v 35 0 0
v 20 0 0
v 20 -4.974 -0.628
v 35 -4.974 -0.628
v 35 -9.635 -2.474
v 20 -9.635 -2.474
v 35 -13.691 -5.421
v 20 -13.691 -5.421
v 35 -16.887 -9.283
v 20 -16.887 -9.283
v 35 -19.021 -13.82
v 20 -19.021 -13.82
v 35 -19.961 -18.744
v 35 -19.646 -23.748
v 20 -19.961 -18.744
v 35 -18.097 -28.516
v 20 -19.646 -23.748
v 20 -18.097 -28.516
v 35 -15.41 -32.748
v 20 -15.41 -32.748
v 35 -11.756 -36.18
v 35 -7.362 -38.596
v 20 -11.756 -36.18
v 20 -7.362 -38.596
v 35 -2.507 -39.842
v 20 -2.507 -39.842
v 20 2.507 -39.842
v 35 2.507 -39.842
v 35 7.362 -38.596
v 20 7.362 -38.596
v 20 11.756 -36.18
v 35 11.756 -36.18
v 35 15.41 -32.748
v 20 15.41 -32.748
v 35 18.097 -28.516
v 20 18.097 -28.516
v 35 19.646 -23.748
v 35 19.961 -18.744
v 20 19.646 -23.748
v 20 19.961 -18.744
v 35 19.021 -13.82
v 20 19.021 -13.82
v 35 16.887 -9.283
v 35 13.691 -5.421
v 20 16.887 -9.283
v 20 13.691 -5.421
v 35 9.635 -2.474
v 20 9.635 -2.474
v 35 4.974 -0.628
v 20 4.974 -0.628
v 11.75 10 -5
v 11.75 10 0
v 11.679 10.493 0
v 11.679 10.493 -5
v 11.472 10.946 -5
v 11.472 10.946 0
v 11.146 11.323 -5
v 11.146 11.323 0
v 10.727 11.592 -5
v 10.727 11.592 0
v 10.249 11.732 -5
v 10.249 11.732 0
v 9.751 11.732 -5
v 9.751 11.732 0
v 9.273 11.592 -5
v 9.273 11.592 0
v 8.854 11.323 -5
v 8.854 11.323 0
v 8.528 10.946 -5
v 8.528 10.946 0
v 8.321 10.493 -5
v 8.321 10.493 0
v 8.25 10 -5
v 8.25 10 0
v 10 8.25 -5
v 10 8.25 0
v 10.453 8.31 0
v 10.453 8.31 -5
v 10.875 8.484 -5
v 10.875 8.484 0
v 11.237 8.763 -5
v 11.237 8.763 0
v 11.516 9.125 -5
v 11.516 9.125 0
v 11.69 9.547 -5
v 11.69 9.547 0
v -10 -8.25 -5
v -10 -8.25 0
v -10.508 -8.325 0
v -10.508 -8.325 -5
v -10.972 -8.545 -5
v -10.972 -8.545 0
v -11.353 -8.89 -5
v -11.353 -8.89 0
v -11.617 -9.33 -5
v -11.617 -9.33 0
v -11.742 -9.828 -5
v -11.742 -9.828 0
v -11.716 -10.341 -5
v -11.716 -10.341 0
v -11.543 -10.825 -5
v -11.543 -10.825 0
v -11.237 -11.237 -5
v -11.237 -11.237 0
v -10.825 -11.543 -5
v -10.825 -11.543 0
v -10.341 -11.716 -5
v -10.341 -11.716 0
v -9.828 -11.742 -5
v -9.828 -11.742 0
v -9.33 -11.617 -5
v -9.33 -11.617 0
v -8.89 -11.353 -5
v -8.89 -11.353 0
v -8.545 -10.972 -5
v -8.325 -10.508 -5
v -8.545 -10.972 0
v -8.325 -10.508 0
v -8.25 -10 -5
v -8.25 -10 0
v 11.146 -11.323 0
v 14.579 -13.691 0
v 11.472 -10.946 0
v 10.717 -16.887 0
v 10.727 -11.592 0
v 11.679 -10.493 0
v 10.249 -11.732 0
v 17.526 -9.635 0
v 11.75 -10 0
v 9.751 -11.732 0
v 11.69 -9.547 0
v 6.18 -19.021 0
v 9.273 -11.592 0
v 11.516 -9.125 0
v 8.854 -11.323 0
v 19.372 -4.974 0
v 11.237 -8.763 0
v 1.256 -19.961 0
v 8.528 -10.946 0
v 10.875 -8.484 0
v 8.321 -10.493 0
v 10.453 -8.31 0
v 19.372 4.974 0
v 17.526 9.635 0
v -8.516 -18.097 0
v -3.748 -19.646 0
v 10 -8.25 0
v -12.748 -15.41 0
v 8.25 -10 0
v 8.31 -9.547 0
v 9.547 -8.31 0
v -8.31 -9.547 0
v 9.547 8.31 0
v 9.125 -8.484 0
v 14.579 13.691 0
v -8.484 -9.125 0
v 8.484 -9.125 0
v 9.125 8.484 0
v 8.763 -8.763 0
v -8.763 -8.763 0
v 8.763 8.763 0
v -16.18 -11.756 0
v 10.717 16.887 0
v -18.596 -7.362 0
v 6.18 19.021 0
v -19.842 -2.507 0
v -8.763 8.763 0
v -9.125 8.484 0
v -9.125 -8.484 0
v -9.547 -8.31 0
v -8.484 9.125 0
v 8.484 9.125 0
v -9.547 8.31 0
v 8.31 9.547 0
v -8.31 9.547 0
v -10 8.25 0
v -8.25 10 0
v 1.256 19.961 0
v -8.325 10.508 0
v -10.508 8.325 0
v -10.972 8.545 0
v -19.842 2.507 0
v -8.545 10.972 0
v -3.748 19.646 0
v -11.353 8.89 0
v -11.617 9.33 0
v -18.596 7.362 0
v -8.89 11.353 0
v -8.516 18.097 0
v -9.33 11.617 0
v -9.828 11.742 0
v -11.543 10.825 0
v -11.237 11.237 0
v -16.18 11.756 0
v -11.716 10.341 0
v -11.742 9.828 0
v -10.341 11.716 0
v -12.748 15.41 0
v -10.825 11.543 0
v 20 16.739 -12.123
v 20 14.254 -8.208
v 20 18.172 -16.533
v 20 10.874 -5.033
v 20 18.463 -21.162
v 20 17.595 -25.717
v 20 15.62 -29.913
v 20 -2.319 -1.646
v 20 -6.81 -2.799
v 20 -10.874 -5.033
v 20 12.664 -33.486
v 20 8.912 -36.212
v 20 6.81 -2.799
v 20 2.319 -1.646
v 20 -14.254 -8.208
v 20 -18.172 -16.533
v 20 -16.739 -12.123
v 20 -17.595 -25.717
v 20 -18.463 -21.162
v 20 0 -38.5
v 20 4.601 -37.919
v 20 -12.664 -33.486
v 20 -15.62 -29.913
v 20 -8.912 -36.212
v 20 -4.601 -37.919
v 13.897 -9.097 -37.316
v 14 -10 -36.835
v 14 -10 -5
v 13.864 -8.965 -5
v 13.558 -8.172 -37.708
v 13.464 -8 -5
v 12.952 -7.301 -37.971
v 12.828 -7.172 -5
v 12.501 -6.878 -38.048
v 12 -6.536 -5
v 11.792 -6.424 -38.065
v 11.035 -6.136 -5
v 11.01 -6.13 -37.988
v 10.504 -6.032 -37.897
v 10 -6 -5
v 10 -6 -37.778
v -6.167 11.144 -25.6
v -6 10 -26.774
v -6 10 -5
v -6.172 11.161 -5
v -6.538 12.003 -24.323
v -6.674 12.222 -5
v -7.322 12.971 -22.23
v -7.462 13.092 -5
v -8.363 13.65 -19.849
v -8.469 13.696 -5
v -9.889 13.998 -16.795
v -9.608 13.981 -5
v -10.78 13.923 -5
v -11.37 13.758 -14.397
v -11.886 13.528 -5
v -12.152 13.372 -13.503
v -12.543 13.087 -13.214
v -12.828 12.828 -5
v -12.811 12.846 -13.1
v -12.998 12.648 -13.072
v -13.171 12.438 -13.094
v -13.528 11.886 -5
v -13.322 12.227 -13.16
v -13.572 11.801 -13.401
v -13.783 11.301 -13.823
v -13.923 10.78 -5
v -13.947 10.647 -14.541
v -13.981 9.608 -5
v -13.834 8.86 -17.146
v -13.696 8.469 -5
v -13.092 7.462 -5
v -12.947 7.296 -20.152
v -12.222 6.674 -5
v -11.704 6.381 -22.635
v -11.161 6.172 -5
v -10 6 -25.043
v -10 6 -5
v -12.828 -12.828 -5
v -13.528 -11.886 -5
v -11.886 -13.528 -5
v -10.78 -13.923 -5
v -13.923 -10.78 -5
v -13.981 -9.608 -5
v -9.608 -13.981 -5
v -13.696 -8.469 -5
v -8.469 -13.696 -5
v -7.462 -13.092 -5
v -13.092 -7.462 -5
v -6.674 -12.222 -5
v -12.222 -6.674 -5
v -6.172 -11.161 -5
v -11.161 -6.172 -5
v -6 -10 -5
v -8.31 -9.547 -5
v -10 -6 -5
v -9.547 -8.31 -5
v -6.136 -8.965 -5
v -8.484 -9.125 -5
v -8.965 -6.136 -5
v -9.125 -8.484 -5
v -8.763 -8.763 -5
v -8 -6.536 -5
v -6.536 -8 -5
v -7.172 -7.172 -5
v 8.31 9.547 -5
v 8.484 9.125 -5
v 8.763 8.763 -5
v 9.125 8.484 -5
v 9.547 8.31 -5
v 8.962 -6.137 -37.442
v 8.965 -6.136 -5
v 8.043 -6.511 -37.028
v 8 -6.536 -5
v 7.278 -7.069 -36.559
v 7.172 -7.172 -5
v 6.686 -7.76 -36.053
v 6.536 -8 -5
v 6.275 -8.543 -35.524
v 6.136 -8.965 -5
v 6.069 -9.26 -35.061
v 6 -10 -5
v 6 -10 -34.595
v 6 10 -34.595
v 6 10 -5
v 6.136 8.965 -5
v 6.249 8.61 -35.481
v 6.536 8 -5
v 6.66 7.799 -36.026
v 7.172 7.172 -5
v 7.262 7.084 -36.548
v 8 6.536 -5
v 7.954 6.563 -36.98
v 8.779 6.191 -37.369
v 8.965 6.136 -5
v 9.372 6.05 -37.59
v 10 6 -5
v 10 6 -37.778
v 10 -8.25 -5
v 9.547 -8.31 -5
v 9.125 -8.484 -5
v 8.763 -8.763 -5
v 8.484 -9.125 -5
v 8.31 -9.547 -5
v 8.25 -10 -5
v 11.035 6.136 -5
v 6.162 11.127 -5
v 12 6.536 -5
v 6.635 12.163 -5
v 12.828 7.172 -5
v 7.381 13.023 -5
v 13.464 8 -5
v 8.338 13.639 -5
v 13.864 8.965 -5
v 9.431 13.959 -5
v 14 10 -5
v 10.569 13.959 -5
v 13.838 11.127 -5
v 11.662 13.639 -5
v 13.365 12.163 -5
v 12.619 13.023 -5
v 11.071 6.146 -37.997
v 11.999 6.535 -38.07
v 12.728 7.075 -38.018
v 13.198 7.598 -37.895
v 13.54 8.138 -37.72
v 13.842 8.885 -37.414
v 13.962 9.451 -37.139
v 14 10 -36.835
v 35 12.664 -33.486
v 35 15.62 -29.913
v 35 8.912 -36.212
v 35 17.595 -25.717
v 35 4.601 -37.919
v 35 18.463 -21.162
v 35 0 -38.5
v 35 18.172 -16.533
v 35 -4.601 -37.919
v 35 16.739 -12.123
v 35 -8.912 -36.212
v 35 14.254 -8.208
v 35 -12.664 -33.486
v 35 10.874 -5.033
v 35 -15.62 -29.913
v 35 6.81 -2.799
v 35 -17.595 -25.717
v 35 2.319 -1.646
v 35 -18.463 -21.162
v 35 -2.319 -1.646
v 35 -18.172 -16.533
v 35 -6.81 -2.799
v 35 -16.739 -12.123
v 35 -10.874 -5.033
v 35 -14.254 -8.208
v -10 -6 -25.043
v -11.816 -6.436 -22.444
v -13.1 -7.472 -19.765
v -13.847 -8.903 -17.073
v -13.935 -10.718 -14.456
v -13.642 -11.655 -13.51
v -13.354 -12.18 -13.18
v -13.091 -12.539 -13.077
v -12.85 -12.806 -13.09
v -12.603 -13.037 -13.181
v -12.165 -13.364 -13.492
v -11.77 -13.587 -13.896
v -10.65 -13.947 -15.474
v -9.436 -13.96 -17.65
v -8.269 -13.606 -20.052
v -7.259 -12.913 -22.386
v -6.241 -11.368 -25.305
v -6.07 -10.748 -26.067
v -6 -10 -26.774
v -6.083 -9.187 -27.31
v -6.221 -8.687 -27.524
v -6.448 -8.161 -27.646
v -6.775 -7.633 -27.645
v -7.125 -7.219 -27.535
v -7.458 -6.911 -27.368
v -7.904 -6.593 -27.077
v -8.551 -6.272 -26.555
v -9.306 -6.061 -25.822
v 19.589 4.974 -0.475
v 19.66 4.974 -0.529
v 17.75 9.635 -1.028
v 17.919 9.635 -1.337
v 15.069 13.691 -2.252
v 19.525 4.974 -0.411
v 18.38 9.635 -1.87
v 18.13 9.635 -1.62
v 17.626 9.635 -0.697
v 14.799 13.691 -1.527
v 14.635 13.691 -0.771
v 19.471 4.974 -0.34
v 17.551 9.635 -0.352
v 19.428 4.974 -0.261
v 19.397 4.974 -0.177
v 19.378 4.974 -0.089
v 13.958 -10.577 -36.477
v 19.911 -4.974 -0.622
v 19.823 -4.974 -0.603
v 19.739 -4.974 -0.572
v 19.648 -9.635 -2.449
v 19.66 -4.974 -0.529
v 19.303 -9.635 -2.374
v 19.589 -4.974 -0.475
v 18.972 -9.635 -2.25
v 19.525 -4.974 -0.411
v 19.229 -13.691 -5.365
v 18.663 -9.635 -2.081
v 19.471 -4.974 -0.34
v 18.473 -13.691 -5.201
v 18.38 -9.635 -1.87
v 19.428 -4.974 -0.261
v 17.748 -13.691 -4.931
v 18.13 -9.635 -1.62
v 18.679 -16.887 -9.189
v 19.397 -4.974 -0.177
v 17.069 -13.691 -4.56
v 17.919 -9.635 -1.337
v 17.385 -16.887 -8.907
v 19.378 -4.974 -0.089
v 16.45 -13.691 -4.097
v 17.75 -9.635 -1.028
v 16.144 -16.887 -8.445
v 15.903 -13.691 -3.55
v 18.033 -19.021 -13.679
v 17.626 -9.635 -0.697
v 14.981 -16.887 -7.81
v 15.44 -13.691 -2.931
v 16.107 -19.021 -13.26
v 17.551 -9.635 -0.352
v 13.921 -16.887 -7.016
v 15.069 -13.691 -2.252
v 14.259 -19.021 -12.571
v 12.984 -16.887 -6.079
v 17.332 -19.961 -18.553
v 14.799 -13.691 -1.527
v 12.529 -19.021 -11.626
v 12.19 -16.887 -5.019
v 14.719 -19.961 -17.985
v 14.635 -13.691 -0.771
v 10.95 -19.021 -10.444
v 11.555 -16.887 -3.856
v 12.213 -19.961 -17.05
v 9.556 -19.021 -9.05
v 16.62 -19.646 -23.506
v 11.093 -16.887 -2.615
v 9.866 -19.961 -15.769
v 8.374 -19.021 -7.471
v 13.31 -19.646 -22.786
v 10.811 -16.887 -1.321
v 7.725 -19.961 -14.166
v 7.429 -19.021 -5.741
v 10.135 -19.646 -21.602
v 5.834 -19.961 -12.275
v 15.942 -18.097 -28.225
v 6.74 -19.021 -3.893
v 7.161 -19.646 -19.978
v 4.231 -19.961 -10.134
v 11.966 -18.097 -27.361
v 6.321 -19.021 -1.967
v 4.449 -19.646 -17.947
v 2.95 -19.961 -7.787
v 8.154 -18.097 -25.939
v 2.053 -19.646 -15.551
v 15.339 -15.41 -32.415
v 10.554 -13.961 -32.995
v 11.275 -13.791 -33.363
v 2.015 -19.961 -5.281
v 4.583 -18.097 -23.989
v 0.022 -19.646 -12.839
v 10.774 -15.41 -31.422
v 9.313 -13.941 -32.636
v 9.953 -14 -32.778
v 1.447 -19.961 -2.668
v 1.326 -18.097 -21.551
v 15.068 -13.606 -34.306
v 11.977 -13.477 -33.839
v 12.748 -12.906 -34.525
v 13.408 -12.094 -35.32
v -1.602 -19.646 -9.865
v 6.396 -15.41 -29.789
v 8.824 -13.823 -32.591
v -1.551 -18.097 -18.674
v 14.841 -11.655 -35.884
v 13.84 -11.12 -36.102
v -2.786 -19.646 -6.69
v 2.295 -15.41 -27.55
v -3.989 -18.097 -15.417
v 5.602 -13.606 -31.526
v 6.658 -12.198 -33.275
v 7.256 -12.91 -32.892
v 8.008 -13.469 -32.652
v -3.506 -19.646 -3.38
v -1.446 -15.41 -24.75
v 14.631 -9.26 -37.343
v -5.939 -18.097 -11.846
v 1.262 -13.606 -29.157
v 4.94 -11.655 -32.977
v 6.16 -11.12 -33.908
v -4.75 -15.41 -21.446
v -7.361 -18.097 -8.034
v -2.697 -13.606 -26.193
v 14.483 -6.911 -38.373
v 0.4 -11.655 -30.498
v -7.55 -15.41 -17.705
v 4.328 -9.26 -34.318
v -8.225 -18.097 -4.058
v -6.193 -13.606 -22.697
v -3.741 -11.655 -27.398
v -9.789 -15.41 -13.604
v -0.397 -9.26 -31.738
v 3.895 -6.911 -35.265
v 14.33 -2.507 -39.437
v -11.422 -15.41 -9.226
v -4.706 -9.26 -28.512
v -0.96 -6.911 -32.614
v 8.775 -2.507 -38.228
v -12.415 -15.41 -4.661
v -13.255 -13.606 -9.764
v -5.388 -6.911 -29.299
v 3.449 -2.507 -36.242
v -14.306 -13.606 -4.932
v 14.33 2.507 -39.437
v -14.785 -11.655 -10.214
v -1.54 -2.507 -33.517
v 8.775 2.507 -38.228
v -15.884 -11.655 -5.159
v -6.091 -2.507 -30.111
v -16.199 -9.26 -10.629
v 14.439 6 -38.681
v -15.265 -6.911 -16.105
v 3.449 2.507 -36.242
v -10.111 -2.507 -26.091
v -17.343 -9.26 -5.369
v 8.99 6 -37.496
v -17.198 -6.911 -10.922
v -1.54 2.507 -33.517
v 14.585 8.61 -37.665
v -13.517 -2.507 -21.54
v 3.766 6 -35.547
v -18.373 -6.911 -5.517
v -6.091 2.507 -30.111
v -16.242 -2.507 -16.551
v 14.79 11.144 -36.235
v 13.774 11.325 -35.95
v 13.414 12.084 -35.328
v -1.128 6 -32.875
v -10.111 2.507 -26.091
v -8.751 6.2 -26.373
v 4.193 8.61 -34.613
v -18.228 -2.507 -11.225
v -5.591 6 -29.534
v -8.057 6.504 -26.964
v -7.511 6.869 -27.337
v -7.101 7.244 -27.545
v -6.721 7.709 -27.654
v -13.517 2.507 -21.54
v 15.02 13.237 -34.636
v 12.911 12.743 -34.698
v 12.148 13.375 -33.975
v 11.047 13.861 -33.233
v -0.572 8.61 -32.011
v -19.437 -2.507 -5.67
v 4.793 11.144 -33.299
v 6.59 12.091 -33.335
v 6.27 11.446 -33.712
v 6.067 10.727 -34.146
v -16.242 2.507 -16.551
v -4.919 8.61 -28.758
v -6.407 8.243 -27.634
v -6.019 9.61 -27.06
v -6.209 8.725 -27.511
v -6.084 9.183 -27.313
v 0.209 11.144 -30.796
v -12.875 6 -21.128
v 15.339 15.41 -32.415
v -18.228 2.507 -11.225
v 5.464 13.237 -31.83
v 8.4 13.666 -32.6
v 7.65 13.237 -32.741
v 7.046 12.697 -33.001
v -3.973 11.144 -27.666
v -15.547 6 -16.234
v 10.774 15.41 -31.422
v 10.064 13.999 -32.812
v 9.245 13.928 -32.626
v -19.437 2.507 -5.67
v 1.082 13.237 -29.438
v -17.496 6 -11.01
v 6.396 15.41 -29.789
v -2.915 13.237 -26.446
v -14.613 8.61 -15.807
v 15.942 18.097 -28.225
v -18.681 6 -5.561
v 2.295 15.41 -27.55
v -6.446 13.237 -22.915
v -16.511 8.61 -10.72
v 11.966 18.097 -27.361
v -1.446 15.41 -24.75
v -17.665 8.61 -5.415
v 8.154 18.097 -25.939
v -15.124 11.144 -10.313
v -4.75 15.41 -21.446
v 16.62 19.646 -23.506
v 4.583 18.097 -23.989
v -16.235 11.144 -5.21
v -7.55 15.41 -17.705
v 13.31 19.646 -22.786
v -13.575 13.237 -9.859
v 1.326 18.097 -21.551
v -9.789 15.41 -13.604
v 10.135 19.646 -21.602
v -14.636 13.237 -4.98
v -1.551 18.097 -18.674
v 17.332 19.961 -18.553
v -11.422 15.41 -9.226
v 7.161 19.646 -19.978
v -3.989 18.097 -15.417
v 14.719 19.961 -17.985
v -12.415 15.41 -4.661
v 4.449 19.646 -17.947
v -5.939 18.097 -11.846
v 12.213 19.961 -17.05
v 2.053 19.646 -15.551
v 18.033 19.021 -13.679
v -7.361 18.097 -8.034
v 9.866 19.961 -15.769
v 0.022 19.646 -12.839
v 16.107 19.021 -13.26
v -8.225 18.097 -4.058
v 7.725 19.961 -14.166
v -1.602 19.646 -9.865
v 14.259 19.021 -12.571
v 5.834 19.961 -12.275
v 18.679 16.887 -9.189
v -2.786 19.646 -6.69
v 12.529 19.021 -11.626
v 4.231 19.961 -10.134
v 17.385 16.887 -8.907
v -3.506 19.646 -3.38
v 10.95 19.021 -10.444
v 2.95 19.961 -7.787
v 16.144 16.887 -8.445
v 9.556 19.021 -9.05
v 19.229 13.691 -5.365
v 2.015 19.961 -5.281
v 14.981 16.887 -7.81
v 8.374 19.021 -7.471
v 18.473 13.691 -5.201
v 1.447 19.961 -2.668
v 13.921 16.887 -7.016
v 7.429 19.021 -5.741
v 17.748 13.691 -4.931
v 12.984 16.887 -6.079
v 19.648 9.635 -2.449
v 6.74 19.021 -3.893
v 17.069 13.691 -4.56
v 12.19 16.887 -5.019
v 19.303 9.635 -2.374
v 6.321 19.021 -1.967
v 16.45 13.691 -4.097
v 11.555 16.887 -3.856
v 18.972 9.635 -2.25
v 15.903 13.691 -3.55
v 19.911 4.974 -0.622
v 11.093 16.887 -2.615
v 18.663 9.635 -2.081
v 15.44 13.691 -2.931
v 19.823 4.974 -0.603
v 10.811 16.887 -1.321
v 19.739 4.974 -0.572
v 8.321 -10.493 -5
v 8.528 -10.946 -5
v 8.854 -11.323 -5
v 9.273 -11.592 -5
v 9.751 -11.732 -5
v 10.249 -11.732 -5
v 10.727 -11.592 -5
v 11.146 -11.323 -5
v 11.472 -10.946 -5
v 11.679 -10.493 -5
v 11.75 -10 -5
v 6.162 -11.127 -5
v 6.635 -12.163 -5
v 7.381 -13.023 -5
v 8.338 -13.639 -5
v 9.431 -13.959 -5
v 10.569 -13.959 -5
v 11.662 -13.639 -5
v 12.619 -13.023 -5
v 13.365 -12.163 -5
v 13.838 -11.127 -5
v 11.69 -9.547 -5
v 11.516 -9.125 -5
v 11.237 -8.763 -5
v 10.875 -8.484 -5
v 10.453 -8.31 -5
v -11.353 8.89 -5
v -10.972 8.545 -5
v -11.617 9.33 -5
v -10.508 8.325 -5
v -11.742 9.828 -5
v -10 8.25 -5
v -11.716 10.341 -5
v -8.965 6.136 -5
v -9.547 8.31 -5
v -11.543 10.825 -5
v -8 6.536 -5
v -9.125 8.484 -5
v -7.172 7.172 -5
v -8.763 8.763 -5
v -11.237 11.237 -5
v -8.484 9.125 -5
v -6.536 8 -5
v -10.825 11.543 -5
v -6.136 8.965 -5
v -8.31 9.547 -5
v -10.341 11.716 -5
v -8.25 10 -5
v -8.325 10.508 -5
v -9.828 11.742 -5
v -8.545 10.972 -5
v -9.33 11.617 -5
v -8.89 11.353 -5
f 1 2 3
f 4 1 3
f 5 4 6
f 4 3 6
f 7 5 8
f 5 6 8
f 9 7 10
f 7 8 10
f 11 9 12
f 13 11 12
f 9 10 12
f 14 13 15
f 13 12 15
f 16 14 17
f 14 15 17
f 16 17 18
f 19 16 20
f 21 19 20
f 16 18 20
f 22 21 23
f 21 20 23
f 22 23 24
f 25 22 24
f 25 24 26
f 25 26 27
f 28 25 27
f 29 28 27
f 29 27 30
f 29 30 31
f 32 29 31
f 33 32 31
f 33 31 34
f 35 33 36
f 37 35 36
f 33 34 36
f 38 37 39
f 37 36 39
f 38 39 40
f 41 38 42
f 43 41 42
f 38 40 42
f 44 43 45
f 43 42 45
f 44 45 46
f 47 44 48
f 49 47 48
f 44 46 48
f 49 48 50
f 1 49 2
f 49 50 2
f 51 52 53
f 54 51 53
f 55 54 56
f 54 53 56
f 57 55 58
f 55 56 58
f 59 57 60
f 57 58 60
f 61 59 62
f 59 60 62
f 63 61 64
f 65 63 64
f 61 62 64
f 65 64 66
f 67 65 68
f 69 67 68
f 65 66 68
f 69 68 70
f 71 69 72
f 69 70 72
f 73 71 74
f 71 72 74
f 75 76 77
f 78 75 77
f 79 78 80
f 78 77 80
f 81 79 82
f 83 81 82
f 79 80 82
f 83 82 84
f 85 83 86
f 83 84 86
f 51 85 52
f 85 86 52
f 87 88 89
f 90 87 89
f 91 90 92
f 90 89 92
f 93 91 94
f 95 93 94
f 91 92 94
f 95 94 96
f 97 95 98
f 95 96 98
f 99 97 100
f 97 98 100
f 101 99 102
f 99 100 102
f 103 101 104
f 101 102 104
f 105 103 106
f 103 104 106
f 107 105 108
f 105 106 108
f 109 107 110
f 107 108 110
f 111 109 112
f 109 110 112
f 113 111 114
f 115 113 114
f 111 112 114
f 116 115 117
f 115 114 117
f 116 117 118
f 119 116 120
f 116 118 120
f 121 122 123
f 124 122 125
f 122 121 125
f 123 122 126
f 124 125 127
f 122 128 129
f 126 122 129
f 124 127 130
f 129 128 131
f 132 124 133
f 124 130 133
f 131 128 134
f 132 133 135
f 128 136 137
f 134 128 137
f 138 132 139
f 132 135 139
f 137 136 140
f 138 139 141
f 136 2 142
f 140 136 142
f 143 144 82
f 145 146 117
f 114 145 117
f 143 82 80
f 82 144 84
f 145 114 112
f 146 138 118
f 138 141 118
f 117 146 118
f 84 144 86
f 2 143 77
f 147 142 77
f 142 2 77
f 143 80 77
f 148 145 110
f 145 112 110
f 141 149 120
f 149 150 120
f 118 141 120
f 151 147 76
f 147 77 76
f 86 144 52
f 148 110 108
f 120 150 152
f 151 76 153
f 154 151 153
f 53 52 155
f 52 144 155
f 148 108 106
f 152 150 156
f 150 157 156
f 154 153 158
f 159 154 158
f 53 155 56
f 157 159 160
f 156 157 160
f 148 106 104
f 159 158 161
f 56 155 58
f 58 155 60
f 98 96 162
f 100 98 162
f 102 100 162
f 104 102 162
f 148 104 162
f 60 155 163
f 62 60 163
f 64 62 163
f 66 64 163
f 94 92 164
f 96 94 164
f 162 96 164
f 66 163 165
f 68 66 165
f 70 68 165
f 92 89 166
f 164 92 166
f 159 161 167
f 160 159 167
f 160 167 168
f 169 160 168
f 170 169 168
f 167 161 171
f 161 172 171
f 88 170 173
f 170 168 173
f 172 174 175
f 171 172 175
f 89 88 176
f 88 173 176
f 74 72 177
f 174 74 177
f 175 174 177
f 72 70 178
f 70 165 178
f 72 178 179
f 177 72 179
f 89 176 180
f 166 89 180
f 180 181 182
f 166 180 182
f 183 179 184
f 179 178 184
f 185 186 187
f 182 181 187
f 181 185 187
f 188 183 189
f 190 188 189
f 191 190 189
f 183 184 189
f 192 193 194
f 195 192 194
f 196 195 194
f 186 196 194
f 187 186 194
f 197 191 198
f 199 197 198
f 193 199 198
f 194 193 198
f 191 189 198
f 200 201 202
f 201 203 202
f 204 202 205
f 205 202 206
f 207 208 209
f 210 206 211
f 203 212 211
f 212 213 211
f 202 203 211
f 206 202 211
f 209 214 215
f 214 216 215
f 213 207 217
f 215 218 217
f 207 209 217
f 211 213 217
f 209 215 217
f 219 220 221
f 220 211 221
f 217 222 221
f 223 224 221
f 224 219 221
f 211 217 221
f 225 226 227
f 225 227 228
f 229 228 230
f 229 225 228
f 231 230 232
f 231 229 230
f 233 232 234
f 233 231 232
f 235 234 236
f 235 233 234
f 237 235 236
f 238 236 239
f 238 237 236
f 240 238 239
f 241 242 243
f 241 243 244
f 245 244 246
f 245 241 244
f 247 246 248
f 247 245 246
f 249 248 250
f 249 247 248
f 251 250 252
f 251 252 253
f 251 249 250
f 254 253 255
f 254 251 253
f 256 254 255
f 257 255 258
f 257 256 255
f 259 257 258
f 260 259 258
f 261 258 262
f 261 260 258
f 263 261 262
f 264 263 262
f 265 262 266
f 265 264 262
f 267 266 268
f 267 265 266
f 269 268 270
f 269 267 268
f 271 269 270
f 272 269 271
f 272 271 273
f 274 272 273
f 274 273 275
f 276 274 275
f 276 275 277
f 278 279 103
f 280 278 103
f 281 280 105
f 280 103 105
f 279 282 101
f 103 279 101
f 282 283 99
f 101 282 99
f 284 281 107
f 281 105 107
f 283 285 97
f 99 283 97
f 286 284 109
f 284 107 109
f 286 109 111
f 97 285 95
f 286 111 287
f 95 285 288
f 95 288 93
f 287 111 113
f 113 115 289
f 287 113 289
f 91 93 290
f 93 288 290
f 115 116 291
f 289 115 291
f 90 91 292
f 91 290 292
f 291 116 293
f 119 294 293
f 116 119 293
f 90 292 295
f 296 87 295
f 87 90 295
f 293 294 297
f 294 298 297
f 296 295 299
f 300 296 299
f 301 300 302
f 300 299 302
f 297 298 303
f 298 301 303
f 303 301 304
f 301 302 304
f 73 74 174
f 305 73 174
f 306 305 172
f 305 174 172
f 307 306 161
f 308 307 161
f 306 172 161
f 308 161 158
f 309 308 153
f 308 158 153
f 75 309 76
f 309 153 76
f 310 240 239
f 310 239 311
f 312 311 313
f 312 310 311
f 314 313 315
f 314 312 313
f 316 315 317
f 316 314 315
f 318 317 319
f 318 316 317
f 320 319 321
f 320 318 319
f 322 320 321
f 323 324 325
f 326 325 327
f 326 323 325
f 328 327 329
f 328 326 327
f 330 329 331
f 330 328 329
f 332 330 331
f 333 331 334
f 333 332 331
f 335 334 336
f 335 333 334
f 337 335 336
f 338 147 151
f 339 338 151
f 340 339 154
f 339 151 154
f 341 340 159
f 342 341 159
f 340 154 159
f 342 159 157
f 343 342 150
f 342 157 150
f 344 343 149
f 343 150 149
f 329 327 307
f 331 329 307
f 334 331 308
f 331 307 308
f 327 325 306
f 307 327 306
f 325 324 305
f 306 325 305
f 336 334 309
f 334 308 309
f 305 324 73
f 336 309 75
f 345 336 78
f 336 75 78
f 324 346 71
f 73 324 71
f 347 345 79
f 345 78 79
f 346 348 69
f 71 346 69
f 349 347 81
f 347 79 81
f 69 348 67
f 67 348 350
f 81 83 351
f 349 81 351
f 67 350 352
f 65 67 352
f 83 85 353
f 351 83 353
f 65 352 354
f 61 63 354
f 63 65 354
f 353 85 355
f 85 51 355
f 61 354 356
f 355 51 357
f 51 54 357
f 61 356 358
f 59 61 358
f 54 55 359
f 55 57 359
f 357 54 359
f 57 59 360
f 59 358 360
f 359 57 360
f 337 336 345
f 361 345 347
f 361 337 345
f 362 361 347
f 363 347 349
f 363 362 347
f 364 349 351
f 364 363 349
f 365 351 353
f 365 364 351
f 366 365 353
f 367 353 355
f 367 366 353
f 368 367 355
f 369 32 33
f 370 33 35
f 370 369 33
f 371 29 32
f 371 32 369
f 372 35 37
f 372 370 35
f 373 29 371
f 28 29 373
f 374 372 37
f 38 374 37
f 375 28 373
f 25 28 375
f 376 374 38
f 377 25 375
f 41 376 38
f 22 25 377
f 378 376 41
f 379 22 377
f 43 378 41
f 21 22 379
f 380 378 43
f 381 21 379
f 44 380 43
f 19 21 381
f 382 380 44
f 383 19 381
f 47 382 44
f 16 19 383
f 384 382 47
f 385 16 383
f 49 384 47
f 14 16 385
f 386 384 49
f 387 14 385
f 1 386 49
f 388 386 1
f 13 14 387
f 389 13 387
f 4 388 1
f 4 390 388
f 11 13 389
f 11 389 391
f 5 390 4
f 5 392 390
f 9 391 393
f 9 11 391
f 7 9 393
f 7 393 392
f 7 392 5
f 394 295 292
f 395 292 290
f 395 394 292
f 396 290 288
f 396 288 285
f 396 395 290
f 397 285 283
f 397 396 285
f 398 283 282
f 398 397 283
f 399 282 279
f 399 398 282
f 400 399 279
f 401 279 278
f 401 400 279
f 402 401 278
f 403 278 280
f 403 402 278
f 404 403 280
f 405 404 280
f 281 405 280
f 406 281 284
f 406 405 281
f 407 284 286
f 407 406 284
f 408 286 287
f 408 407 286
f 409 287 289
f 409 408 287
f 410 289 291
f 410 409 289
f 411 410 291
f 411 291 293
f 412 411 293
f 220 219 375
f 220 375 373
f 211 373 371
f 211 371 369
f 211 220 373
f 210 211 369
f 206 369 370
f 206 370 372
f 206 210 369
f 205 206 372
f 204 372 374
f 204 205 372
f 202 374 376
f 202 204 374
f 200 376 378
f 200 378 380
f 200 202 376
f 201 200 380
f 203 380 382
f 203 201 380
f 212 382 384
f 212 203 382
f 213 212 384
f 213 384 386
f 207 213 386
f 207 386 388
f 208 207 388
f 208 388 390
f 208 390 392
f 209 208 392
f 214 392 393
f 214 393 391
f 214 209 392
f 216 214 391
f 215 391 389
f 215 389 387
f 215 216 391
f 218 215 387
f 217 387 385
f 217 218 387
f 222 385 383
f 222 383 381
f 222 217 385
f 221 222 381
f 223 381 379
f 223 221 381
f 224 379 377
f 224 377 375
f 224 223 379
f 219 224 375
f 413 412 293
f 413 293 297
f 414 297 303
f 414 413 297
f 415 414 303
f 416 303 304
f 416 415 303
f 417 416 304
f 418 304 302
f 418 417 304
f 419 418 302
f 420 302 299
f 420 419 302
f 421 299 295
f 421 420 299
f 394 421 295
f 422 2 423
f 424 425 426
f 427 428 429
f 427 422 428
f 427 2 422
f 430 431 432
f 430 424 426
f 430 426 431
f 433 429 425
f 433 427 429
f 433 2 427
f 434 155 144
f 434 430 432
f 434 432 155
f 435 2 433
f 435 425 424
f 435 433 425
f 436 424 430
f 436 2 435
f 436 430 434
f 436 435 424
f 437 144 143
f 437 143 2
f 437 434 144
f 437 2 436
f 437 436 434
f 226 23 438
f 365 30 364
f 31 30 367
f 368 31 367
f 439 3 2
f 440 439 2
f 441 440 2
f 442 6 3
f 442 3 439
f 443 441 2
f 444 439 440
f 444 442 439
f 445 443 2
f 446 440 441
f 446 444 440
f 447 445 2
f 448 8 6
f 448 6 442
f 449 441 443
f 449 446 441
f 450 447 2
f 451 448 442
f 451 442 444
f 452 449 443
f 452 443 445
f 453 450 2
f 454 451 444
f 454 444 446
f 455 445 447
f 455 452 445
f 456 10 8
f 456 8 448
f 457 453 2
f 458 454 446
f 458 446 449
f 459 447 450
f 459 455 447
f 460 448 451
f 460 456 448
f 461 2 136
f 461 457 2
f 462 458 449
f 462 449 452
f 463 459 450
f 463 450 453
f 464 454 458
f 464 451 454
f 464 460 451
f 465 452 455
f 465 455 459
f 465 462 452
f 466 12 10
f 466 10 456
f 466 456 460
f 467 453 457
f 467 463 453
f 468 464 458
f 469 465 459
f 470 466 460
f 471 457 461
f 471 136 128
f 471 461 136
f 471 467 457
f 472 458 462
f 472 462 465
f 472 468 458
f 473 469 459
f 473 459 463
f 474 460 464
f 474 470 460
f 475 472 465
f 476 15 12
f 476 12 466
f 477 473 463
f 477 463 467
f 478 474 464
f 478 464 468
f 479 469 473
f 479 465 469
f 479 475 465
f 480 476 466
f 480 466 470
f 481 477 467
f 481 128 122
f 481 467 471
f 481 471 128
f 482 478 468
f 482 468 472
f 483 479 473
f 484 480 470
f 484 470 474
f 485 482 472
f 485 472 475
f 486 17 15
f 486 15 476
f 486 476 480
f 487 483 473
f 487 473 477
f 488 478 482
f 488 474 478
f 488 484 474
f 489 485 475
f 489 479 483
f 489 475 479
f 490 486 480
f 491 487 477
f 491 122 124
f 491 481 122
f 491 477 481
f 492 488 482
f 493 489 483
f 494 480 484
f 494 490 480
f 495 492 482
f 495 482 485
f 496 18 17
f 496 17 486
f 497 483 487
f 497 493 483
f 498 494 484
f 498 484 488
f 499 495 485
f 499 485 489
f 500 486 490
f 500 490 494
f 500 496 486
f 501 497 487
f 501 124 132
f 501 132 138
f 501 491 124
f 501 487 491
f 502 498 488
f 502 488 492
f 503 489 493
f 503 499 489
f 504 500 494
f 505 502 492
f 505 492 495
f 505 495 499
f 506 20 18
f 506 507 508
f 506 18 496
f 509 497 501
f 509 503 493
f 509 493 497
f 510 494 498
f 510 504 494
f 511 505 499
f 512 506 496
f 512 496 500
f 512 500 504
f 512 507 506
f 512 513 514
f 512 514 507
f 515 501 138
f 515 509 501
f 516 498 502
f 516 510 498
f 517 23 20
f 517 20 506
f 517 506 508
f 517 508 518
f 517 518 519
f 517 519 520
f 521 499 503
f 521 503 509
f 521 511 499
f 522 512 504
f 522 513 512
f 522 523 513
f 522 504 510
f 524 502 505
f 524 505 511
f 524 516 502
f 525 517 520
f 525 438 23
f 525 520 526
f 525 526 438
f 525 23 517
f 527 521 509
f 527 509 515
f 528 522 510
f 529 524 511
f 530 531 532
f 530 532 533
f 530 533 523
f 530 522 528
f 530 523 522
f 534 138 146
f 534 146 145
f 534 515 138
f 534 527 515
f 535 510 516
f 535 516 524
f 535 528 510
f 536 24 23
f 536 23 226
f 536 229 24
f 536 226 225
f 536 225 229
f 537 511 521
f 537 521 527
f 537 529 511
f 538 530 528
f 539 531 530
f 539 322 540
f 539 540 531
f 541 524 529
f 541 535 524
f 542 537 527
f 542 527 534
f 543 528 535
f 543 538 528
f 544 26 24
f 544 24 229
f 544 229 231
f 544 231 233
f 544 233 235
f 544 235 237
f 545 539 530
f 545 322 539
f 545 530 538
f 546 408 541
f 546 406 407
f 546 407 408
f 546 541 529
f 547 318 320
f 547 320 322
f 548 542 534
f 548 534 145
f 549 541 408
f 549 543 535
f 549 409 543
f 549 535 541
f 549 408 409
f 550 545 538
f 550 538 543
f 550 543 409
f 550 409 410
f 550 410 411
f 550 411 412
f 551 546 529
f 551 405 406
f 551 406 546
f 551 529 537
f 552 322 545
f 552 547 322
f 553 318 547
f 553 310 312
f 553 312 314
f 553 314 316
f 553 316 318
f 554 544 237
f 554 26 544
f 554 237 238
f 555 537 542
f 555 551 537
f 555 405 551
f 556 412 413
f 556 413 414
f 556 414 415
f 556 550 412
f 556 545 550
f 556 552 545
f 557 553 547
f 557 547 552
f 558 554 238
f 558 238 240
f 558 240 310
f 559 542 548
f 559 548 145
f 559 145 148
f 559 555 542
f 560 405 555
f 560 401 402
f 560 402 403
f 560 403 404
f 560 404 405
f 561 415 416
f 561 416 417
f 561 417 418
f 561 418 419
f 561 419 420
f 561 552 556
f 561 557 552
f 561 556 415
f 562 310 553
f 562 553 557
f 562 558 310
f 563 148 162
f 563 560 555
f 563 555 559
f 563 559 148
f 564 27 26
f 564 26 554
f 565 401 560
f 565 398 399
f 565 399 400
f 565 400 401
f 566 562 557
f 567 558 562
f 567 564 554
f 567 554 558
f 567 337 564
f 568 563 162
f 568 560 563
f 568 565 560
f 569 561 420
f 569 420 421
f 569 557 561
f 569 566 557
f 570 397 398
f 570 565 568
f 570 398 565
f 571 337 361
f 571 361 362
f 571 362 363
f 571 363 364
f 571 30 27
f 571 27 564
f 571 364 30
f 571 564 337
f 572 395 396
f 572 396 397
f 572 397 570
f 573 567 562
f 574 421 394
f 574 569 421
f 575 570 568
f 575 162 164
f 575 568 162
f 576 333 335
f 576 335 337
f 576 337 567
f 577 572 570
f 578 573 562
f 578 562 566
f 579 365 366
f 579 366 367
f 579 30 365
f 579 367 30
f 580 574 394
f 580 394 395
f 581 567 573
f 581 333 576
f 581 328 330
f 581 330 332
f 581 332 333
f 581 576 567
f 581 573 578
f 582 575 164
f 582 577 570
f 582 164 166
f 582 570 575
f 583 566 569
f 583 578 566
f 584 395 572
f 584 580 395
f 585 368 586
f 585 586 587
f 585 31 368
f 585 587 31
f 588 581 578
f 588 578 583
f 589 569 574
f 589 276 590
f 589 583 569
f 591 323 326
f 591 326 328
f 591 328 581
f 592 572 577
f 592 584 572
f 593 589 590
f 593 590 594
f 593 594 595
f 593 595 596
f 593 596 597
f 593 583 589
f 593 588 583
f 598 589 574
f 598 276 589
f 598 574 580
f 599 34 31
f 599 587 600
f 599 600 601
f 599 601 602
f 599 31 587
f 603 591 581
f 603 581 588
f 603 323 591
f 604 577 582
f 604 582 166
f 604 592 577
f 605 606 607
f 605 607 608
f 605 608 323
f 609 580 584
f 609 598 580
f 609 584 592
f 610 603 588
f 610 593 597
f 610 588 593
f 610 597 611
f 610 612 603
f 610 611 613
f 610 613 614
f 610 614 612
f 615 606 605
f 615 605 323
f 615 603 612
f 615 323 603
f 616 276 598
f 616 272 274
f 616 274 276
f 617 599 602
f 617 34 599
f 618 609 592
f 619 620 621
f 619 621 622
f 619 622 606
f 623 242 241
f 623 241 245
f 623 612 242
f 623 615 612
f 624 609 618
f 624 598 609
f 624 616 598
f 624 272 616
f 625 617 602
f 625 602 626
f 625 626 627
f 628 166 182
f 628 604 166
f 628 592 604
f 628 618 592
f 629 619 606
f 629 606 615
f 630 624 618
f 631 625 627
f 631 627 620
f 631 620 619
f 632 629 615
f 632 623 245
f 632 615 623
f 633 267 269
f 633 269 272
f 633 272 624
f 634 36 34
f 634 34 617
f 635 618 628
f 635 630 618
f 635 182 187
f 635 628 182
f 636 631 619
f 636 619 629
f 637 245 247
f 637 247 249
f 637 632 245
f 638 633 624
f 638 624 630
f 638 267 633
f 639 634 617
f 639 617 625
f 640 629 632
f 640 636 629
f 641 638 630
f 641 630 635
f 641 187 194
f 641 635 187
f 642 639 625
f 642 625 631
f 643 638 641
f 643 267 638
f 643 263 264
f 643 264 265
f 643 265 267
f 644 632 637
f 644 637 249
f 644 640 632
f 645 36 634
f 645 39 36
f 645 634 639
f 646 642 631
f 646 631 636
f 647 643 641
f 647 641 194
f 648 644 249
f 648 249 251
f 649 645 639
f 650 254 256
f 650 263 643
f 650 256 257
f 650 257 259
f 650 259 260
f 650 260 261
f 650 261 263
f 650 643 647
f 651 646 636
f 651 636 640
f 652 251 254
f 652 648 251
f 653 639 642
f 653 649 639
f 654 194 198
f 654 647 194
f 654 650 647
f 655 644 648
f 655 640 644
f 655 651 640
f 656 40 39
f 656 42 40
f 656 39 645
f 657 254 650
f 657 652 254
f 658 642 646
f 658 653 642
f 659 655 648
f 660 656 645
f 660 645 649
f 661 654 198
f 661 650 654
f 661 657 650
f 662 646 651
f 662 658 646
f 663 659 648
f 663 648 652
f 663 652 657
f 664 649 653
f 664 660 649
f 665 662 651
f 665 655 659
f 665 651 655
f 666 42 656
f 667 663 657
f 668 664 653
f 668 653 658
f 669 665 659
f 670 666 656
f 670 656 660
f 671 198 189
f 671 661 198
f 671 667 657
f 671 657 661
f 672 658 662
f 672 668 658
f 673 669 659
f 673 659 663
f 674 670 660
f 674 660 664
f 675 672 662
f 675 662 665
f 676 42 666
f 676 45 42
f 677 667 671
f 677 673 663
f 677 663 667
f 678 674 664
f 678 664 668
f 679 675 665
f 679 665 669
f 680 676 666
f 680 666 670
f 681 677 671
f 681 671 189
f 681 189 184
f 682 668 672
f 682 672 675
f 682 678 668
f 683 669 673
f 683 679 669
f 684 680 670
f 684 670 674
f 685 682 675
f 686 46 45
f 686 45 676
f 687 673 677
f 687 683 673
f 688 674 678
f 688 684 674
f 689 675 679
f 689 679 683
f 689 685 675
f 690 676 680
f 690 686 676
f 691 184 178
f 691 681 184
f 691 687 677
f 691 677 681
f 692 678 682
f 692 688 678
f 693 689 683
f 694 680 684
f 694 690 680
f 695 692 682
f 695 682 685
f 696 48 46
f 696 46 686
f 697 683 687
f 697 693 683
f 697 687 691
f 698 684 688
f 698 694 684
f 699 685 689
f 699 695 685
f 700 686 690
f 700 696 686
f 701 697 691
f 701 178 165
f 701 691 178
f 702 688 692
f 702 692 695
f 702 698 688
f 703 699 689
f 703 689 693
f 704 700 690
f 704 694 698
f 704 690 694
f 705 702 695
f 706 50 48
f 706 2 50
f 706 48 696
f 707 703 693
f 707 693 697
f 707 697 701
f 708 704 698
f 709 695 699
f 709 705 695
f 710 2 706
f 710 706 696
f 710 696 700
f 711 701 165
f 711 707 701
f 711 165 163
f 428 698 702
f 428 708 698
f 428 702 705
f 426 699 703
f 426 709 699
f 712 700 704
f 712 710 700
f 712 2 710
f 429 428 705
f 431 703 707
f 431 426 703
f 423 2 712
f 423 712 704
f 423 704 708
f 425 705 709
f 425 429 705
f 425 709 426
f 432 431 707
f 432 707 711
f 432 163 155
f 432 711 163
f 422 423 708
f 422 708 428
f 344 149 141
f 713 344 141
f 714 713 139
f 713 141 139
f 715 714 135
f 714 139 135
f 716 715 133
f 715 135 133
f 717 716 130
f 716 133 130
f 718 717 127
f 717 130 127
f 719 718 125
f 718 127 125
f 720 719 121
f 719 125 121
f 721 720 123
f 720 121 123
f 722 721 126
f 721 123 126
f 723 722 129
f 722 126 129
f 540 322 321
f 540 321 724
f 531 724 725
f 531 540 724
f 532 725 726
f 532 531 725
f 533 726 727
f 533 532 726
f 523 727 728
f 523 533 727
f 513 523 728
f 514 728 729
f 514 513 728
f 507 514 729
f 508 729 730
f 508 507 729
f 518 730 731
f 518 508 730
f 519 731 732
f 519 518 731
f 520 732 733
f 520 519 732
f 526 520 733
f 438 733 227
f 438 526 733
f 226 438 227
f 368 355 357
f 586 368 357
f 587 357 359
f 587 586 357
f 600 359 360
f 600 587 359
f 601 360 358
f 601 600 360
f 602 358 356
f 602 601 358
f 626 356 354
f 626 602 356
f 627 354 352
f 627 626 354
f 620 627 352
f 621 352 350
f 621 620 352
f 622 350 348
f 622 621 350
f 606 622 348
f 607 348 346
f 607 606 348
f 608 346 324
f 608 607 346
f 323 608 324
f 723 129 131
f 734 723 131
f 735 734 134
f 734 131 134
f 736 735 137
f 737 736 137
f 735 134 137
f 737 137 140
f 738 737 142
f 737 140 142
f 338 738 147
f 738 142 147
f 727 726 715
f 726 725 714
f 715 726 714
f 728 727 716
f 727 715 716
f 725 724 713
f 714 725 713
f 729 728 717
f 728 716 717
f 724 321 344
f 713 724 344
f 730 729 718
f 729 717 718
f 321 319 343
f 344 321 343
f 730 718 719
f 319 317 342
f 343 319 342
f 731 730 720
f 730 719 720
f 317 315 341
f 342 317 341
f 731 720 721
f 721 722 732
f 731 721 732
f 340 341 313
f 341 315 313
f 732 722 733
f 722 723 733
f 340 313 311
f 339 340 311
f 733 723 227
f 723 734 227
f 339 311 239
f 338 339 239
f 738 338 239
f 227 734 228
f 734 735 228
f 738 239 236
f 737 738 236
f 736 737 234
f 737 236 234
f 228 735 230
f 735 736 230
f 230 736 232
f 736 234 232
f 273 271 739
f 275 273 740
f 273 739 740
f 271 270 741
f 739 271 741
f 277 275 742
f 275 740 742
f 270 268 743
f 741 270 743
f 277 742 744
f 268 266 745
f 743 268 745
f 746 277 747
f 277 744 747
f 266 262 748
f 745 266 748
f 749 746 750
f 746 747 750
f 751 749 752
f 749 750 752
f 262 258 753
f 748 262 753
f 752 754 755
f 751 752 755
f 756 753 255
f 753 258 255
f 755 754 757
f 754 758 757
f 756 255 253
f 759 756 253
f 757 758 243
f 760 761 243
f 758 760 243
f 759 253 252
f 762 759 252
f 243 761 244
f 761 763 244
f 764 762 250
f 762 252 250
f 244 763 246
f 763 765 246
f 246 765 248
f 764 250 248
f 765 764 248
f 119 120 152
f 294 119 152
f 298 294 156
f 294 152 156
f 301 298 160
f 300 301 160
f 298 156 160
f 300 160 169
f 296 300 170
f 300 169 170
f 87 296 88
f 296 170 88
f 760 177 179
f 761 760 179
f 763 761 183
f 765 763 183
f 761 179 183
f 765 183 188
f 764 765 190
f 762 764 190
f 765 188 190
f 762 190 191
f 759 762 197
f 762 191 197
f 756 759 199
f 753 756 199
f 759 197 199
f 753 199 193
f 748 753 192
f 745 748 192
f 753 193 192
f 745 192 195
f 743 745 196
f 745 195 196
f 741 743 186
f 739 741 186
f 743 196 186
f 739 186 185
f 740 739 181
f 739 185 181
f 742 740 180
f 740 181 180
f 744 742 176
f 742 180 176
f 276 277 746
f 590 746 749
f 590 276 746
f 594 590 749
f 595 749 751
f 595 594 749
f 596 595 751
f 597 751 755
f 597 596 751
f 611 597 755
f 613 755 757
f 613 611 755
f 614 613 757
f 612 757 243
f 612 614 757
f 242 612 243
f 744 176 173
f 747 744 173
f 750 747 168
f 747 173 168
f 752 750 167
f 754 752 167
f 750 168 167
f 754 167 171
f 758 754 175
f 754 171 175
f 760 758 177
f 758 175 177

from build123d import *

# Parameters (mm, degrees)
SKETCH_1_R          = 20
SKETCH_3_R          = 20
SKETCH_3_R_2        = 18.5
EXTRUDE_1_DEPTH     = 15
CUT_EXTRUDE_1_DEPTH = 57.789083564
CUT_EXTRUDE_2_DEPTH = 35


with BuildPart() as part:
    # 扫描1: sweep along a path in 草图2
    with BuildLine(Plane(origin=(0, 0, 0), x_dir=(1, 0, 0), z_dir=(0, 1, 0))) as sweep_1_path:
        ThreePointArc((20, 20), (5.857864376, 14.142135624), (0, 0))
    # 草图1 → 扫描1 (sweep)
    with BuildSketch(Plane.XY):
        Circle(SKETCH_1_R)
    sweep(path=sweep_1_path.line)

    # 草图3 → 凸台-拉伸1 (add)
    with BuildSketch(Plane(origin=(20, 0, 0), x_dir=(0, 0, -1), z_dir=(1, 0, 0))):
        with Locations(Location((20, 0, 0), (0, 0, 180))):
            Circle(SKETCH_3_R)
        with Locations((20, 0)):
            Circle(SKETCH_3_R_2, mode=Mode.SUBTRACT)
    extrude(amount=EXTRUDE_1_DEPTH)

    # 草图4 → 切除-拉伸1 (cut, through all)
    with BuildSketch(Plane.XY):
        with BuildLine():
            Line((-10, 8.25), (-10, 10))
            Line((-10, 10), (-8.25, 10))
            ThreePointArc((-8.25, 10), (-11.237436867, 11.237436867), (-10, 8.25))
        make_face()
        with BuildLine():
            Line((-8.25, 10), (-10, 10))
            Line((-10, 10), (-10, 8.25))
            ThreePointArc((-10, 8.25), (-8.762563133, 8.762563133), (-8.25, 10))
        make_face()
        with BuildLine():
            ThreePointArc((11.75, 10), (10, 11.75), (8.25, 10))
            Line((8.25, 10), (10, 10))
            Line((10, 10), (10, 8.25))
            ThreePointArc((10, 8.25), (11.237436867, 8.762563133), (11.75, 10))
        make_face()
        with BuildLine():
            Line((10, 10), (8.25, 10))
            ThreePointArc((8.25, 10), (8.762563133, 8.762563133), (10, 8.25))
            Line((10, 8.25), (10, 10))
        make_face()
        with BuildLine():
            ThreePointArc((11.75, -10), (11.237436867, -8.762563133), (10, -8.25))
            Line((10, -8.25), (10, -10))
            Line((10, -10), (8.25, -10))
            ThreePointArc((8.25, -10), (10, -11.75), (11.75, -10))
        make_face()
        with BuildLine():
            Line((10, -10), (10, -8.25))
            ThreePointArc((10, -8.25), (8.762563133, -8.762563133), (8.25, -10))
            Line((8.25, -10), (10, -10))
        make_face()
        with BuildLine():
            ThreePointArc((-8.25, -10), (-8.762563133, -8.762563133), (-10, -8.25))
            Line((-10, -8.25), (-10, -10))
            Line((-10, -10), (-8.25, -10))
        make_face()
        with BuildLine():
            Line((-10, -10), (-10, -8.25))
            ThreePointArc((-10, -8.25), (-11.237436867, -11.237436867), (-8.25, -10))
            Line((-8.25, -10), (-10, -10))
        make_face()
    extrude(amount=-CUT_EXTRUDE_1_DEPTH, mode=Mode.SUBTRACT)

    # 草图5 → 切除-拉伸2 (cut)
    with BuildSketch(Plane.XY.offset(-40)):
        with BuildLine():
            ThreePointArc((14, 10), (10, 14), (6, 10))
            Line((6, 10), (10, 10))
            Line((10, 10), (10, 6))
            ThreePointArc((10, 6), (12.828427125, 7.171572875), (14, 10))
        make_face()
        with BuildLine():
            Line((10, 10), (6, 10))
            ThreePointArc((6, 10), (7.171572875, 7.171572875), (10, 6))
            Line((10, 6), (10, 10))
        make_face()
        with BuildLine():
            Line((-10, 6), (-10, 10))
            Line((-10, 10), (-6, 10))
            ThreePointArc((-6, 10), (-12.828427125, 12.828427125), (-10, 6))
        make_face()
        with BuildLine():
            Line((-6, 10), (-10, 10))
            Line((-10, 10), (-10, 6))
            ThreePointArc((-10, 6), (-7.171572875, 7.171572875), (-6, 10))
        make_face()
        with BuildLine():
            ThreePointArc((14, -10), (12.828427125, -7.171572875), (10, -6))
            Line((10, -6), (10, -10))
            Line((10, -10), (6, -10))
            ThreePointArc((6, -10), (10, -14), (14, -10))
        make_face()
        with BuildLine():
            Line((10, -10), (10, -6))
            ThreePointArc((10, -6), (7.171572875, -7.171572875), (6, -10))
            Line((6, -10), (10, -10))
        make_face()
        with BuildLine():
            ThreePointArc((-6, -10), (-7.171572875, -7.171572875), (-10, -6))
            Line((-10, -6), (-10, -10))
            Line((-10, -10), (-6, -10))
        make_face()
        with BuildLine():
            Line((-10, -10), (-10, -6))
            ThreePointArc((-10, -6), (-12.828427125, -12.828427125), (-6, -10))
            Line((-6, -10), (-10, -10))
        make_face()
    extrude(amount=CUT_EXTRUDE_2_DEPTH, mode=Mode.SUBTRACT)


solid = part.part
